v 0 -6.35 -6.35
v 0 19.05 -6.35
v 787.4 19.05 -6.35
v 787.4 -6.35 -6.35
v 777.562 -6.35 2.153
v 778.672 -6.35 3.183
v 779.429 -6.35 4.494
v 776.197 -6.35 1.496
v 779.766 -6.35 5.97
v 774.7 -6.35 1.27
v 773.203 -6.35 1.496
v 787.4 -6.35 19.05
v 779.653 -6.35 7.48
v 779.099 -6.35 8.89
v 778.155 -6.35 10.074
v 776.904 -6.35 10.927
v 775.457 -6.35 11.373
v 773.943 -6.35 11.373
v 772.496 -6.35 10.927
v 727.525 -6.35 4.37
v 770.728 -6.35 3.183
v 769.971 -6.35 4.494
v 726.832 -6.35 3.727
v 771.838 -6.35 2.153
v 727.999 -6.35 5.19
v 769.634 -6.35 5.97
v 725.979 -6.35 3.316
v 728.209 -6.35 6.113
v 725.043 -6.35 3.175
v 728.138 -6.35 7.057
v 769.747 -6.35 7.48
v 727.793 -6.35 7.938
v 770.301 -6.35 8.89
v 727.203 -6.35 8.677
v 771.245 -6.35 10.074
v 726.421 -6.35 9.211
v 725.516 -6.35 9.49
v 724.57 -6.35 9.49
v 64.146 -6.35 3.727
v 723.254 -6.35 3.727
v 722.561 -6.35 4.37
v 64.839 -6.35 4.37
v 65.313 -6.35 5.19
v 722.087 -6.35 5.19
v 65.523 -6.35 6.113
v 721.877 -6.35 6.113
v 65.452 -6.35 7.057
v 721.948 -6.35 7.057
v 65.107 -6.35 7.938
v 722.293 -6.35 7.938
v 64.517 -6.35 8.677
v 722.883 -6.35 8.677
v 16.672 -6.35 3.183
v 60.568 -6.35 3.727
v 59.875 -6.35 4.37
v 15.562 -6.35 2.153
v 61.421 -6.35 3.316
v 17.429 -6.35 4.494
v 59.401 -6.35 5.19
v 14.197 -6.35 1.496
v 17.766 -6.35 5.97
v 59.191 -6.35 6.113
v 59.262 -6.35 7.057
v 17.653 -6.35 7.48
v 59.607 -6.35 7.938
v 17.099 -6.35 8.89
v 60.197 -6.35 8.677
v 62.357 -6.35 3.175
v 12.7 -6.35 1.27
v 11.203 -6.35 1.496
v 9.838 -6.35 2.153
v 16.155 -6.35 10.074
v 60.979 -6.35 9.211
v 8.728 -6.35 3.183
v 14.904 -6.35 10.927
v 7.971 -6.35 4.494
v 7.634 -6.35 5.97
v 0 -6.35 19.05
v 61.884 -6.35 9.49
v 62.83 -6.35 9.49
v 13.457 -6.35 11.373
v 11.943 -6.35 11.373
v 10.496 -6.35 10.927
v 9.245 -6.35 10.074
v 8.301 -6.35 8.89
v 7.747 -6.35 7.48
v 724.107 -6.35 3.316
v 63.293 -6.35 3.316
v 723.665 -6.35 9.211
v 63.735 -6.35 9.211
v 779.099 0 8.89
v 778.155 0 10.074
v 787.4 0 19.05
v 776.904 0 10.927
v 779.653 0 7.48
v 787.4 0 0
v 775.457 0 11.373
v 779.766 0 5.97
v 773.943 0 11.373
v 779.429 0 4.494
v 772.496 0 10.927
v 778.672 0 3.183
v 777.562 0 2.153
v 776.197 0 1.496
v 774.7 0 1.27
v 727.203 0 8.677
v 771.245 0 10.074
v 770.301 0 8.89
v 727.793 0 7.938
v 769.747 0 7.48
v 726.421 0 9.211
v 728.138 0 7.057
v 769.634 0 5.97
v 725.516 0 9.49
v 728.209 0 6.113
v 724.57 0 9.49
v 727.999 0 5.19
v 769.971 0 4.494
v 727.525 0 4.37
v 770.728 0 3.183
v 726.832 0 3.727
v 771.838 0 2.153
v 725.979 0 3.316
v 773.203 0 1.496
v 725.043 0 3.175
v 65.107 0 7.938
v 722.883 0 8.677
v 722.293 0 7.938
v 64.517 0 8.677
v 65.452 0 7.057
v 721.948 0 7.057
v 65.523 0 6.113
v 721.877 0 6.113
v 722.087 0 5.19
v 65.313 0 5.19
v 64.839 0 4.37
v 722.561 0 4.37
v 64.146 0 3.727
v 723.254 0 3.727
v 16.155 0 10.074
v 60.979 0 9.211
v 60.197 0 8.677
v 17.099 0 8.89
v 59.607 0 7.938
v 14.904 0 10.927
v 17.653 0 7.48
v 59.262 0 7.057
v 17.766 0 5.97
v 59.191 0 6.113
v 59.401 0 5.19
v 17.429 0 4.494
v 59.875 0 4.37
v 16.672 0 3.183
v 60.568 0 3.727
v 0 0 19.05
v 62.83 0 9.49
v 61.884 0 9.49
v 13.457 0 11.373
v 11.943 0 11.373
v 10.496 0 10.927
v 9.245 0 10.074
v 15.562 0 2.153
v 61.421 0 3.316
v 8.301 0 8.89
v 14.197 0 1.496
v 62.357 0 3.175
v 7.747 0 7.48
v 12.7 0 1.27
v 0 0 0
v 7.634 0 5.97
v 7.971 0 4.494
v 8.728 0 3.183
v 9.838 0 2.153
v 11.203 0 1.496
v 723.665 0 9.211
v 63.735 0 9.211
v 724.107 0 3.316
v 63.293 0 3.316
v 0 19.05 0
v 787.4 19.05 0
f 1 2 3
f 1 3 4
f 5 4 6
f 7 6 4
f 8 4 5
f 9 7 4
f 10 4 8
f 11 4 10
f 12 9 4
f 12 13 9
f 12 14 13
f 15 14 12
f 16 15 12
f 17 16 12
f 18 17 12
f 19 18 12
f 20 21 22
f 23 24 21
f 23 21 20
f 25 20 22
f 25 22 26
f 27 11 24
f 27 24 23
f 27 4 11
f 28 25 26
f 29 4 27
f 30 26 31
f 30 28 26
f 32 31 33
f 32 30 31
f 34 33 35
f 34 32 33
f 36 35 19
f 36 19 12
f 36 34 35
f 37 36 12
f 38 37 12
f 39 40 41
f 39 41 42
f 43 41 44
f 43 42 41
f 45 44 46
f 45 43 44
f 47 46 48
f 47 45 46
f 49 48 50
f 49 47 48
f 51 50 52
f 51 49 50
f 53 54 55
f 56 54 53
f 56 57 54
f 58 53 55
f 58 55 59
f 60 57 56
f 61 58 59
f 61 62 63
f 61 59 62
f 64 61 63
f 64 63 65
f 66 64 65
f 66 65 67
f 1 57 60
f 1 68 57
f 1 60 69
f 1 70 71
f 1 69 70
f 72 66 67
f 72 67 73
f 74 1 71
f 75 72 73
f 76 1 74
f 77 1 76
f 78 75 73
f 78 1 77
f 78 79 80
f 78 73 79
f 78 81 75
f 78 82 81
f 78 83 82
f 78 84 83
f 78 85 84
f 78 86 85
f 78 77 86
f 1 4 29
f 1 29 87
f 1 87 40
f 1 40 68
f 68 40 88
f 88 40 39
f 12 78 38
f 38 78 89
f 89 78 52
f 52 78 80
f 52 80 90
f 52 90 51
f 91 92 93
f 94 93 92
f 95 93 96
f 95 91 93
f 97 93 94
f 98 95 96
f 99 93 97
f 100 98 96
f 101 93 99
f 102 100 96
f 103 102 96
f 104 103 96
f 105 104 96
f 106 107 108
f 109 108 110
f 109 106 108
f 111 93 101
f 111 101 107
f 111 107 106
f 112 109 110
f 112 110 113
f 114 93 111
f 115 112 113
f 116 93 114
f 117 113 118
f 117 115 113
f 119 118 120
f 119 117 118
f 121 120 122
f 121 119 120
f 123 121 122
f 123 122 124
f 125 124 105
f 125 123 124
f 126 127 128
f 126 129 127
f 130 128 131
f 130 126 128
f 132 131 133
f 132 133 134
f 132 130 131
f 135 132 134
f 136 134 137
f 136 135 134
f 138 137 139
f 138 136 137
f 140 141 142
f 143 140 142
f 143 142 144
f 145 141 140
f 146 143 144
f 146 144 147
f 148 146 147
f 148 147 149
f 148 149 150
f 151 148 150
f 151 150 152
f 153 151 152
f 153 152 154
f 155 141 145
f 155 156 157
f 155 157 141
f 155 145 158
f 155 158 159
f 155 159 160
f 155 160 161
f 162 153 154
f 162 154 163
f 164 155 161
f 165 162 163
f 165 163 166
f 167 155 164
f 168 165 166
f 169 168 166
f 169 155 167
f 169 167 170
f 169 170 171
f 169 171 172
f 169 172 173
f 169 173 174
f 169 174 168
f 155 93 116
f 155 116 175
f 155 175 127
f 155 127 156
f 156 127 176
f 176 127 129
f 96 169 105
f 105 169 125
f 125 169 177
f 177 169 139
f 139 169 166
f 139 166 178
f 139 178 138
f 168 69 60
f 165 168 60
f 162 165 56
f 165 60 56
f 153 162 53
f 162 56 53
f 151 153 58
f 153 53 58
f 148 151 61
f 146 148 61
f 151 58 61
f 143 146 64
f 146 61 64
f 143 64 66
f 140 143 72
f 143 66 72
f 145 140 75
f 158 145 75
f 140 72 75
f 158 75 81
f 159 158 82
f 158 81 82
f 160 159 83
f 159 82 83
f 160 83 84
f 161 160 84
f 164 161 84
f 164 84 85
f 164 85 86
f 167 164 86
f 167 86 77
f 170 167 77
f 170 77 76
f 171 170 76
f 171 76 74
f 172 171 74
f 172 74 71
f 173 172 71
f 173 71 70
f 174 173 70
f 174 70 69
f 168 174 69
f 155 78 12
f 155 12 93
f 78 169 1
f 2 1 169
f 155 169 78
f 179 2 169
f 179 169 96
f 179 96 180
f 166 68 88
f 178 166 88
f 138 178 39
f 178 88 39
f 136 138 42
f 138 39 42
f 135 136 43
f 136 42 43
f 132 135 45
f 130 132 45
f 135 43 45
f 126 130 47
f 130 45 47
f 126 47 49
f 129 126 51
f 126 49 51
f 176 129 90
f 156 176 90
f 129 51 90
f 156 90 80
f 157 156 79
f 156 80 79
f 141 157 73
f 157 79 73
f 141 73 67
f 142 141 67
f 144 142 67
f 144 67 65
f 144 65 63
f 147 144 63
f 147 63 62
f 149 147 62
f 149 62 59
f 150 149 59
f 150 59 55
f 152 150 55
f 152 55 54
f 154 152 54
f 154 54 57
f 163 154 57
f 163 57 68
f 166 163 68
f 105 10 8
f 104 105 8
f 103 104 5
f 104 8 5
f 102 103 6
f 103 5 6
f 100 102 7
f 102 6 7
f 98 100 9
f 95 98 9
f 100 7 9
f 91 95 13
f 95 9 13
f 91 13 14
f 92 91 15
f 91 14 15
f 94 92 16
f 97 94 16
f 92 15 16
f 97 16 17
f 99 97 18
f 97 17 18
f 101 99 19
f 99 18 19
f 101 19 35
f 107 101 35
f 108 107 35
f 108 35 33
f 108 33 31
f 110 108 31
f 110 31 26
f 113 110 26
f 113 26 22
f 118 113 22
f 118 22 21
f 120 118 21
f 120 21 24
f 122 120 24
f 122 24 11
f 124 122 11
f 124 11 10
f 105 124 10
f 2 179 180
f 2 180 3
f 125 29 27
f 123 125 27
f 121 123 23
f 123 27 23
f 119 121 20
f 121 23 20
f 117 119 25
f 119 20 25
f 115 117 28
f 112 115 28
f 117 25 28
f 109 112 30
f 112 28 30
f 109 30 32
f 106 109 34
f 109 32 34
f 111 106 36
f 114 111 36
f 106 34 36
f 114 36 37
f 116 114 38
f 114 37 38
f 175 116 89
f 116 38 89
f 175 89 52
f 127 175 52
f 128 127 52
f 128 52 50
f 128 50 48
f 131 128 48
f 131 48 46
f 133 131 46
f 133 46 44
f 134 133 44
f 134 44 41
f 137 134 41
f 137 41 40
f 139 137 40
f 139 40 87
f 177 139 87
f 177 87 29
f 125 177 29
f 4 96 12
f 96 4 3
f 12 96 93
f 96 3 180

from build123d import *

# Parameters (mm, degrees)
BOSS_EXTRUDE1_DEPTH = 787.4
SKETCH2_R           = 5.08
SKETCH2_R_2         = 3.175
CUT_EXTRUDE1_DEPTH  = 914.4


with BuildPart() as part:
    # Sketch1 → Boss-Extrude1 (new body)
    with BuildSketch(Plane(origin=(0, 0, 0), x_dir=(0, 0, -1), z_dir=(1, 0, 0))):
        Polygon((0, 0), (0, 19.05), (6.35, 19.05), (6.35, -6.35), (-19.05, -6.35), (-19.05, 0), align=None)
    extrude(amount=BOSS_EXTRUDE1_DEPTH)

    # Sketch2 → Cut-Extrude1 (cut)
    with BuildSketch(Plane.XZ.offset(6.35)):
        with Locations(Location((12.7, 6.35, 0), (0, 0, 270))):
            Circle(SKETCH2_R)
        with Locations(Location((62.357, 6.35, 0), (0, 0, 270))):
            Circle(SKETCH2_R_2)
        with Locations(Location((725.043, 6.35, 0), (0, 0, 270))):
            Circle(SKETCH2_R_2)
        with Locations(Location((774.7, 6.35, 0), (0, 0, 270))):
            Circle(SKETCH2_R)
    extrude(amount=-CUT_EXTRUDE1_DEPTH, mode=Mode.SUBTRACT)


solid = part.part
